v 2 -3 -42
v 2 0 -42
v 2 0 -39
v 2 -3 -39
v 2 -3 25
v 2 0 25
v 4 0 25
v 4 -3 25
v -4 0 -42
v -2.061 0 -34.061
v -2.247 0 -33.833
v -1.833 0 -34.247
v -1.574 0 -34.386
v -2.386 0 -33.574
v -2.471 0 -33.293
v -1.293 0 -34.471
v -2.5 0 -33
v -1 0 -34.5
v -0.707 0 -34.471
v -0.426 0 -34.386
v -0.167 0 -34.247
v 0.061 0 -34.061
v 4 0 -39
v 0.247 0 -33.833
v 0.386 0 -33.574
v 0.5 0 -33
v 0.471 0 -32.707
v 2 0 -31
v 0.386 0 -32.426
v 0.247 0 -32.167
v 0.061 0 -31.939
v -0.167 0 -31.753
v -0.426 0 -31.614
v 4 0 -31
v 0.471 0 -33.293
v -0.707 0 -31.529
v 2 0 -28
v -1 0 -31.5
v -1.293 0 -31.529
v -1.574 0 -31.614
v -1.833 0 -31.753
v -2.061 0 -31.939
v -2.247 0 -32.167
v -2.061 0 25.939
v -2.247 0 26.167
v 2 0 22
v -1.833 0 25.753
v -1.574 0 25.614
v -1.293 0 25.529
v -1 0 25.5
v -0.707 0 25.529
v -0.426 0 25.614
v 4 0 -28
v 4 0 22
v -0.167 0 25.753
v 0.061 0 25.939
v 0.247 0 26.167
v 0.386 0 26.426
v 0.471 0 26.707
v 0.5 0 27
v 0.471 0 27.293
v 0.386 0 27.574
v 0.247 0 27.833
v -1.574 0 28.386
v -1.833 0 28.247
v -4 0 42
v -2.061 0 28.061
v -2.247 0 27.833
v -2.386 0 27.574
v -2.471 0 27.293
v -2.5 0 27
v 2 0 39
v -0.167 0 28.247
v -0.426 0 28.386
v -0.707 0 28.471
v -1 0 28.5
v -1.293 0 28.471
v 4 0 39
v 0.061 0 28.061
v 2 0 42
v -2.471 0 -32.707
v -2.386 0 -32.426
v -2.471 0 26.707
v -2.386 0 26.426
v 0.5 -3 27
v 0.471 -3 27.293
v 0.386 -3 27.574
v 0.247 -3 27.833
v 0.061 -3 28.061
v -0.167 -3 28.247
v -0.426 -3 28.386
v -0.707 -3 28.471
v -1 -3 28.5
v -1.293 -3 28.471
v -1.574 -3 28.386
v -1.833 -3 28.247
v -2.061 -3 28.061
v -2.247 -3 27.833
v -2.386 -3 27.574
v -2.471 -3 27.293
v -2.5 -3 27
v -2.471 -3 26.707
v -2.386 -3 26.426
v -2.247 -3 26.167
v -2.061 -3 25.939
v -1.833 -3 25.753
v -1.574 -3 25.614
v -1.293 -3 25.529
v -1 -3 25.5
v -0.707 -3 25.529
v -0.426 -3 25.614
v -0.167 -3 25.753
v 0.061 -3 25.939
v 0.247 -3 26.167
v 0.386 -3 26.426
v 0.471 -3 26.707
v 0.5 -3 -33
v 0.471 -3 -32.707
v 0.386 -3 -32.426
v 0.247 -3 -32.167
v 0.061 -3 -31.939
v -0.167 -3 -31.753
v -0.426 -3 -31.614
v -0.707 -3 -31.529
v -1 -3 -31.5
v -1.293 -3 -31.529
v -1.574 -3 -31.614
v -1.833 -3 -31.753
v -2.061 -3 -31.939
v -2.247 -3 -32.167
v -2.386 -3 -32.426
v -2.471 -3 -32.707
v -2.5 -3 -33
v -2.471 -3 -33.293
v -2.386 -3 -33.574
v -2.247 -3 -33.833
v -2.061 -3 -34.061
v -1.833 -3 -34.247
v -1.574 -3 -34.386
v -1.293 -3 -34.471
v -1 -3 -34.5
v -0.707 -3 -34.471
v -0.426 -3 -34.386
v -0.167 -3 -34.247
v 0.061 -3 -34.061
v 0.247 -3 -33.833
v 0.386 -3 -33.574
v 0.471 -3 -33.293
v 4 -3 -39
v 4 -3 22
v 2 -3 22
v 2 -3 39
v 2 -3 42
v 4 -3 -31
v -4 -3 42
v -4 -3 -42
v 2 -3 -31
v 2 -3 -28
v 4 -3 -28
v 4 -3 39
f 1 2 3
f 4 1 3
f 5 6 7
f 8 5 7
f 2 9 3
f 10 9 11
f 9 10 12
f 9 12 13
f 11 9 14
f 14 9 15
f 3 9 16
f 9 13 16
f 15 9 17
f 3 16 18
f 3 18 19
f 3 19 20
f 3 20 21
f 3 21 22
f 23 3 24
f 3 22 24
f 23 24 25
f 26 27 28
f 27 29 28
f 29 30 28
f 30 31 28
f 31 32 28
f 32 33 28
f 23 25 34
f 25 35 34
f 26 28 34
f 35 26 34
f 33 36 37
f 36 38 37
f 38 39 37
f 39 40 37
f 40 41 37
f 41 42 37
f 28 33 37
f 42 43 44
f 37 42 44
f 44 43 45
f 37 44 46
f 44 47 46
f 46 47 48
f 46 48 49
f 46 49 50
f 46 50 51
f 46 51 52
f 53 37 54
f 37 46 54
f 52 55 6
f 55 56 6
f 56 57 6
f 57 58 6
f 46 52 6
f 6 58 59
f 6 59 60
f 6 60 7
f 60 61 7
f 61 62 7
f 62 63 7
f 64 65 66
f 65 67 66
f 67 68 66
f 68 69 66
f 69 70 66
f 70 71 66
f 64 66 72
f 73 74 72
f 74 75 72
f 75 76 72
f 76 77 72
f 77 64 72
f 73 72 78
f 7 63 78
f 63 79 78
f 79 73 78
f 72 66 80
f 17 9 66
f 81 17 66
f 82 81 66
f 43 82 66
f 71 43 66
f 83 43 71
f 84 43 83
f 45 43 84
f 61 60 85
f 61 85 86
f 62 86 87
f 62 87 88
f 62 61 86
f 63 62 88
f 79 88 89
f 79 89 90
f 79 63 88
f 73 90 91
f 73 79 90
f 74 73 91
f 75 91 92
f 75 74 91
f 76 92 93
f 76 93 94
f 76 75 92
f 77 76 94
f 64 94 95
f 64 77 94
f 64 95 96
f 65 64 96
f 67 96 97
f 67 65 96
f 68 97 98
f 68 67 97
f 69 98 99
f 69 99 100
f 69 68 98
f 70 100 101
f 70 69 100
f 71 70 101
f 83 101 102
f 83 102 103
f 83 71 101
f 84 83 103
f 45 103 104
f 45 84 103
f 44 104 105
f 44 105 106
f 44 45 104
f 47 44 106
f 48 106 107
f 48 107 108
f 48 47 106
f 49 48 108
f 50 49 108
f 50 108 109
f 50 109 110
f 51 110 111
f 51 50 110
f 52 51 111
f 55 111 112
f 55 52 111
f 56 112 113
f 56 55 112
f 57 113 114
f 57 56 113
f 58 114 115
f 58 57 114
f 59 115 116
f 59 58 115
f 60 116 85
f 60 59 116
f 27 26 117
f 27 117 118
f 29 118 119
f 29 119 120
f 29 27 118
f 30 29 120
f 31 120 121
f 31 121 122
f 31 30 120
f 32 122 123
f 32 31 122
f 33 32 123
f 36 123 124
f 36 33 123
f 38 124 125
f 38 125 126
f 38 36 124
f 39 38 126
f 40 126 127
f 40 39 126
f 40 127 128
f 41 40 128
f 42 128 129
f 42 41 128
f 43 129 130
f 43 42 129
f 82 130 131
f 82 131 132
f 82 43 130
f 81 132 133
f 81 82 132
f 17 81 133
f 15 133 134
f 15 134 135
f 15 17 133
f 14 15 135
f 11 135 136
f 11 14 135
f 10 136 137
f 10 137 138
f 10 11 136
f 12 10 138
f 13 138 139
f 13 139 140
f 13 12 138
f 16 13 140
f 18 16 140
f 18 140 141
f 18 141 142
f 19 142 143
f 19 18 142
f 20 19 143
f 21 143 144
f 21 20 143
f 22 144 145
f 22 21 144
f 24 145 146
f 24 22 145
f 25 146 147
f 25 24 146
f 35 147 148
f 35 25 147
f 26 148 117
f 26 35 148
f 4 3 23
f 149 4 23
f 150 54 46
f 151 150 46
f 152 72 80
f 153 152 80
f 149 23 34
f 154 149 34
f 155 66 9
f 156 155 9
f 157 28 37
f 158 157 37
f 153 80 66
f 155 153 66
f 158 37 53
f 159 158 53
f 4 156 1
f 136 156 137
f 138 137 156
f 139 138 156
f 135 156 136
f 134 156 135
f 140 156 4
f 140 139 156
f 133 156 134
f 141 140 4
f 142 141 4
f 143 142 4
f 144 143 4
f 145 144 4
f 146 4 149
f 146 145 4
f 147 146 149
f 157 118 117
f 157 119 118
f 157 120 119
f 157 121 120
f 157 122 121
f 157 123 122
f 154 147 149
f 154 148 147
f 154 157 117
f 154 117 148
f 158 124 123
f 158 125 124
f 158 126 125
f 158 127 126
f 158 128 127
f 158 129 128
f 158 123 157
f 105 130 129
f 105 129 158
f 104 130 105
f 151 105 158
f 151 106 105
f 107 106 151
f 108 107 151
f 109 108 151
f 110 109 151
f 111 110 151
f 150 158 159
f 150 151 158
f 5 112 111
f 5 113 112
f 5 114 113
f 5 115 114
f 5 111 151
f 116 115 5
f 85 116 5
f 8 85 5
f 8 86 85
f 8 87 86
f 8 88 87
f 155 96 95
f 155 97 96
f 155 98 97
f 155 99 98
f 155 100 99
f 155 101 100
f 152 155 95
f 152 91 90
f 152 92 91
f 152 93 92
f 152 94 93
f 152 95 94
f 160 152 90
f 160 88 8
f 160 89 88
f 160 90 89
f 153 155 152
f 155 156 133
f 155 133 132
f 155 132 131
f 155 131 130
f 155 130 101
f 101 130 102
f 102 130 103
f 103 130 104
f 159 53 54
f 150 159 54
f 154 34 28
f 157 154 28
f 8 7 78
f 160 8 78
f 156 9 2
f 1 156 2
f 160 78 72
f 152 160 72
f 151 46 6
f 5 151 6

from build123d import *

# Parameters (mm, degrees)
F0_R     = 1.5
F1_DEPTH = 3


with BuildPart() as f1:
    # F0 (on Front) → F1 (new body)
    with BuildSketch(Plane.XZ):
        Polygon((2, 39), (2, 42), (-4, 42), (-4, -42), (2, -42), (2, -39), (4, -39), (4, -31), (2, -31), (2, -28), (4, -28), (4, 22), (2, 22), (2, 25), (4, 25), (4, 39), align=None)
        with Locations((-1, -33)):
            Circle(F0_R, mode=Mode.SUBTRACT)
        with Locations((-1, 27)):
            Circle(F0_R, mode=Mode.SUBTRACT)
    extrude(amount=F1_DEPTH)


solid = f1.part
